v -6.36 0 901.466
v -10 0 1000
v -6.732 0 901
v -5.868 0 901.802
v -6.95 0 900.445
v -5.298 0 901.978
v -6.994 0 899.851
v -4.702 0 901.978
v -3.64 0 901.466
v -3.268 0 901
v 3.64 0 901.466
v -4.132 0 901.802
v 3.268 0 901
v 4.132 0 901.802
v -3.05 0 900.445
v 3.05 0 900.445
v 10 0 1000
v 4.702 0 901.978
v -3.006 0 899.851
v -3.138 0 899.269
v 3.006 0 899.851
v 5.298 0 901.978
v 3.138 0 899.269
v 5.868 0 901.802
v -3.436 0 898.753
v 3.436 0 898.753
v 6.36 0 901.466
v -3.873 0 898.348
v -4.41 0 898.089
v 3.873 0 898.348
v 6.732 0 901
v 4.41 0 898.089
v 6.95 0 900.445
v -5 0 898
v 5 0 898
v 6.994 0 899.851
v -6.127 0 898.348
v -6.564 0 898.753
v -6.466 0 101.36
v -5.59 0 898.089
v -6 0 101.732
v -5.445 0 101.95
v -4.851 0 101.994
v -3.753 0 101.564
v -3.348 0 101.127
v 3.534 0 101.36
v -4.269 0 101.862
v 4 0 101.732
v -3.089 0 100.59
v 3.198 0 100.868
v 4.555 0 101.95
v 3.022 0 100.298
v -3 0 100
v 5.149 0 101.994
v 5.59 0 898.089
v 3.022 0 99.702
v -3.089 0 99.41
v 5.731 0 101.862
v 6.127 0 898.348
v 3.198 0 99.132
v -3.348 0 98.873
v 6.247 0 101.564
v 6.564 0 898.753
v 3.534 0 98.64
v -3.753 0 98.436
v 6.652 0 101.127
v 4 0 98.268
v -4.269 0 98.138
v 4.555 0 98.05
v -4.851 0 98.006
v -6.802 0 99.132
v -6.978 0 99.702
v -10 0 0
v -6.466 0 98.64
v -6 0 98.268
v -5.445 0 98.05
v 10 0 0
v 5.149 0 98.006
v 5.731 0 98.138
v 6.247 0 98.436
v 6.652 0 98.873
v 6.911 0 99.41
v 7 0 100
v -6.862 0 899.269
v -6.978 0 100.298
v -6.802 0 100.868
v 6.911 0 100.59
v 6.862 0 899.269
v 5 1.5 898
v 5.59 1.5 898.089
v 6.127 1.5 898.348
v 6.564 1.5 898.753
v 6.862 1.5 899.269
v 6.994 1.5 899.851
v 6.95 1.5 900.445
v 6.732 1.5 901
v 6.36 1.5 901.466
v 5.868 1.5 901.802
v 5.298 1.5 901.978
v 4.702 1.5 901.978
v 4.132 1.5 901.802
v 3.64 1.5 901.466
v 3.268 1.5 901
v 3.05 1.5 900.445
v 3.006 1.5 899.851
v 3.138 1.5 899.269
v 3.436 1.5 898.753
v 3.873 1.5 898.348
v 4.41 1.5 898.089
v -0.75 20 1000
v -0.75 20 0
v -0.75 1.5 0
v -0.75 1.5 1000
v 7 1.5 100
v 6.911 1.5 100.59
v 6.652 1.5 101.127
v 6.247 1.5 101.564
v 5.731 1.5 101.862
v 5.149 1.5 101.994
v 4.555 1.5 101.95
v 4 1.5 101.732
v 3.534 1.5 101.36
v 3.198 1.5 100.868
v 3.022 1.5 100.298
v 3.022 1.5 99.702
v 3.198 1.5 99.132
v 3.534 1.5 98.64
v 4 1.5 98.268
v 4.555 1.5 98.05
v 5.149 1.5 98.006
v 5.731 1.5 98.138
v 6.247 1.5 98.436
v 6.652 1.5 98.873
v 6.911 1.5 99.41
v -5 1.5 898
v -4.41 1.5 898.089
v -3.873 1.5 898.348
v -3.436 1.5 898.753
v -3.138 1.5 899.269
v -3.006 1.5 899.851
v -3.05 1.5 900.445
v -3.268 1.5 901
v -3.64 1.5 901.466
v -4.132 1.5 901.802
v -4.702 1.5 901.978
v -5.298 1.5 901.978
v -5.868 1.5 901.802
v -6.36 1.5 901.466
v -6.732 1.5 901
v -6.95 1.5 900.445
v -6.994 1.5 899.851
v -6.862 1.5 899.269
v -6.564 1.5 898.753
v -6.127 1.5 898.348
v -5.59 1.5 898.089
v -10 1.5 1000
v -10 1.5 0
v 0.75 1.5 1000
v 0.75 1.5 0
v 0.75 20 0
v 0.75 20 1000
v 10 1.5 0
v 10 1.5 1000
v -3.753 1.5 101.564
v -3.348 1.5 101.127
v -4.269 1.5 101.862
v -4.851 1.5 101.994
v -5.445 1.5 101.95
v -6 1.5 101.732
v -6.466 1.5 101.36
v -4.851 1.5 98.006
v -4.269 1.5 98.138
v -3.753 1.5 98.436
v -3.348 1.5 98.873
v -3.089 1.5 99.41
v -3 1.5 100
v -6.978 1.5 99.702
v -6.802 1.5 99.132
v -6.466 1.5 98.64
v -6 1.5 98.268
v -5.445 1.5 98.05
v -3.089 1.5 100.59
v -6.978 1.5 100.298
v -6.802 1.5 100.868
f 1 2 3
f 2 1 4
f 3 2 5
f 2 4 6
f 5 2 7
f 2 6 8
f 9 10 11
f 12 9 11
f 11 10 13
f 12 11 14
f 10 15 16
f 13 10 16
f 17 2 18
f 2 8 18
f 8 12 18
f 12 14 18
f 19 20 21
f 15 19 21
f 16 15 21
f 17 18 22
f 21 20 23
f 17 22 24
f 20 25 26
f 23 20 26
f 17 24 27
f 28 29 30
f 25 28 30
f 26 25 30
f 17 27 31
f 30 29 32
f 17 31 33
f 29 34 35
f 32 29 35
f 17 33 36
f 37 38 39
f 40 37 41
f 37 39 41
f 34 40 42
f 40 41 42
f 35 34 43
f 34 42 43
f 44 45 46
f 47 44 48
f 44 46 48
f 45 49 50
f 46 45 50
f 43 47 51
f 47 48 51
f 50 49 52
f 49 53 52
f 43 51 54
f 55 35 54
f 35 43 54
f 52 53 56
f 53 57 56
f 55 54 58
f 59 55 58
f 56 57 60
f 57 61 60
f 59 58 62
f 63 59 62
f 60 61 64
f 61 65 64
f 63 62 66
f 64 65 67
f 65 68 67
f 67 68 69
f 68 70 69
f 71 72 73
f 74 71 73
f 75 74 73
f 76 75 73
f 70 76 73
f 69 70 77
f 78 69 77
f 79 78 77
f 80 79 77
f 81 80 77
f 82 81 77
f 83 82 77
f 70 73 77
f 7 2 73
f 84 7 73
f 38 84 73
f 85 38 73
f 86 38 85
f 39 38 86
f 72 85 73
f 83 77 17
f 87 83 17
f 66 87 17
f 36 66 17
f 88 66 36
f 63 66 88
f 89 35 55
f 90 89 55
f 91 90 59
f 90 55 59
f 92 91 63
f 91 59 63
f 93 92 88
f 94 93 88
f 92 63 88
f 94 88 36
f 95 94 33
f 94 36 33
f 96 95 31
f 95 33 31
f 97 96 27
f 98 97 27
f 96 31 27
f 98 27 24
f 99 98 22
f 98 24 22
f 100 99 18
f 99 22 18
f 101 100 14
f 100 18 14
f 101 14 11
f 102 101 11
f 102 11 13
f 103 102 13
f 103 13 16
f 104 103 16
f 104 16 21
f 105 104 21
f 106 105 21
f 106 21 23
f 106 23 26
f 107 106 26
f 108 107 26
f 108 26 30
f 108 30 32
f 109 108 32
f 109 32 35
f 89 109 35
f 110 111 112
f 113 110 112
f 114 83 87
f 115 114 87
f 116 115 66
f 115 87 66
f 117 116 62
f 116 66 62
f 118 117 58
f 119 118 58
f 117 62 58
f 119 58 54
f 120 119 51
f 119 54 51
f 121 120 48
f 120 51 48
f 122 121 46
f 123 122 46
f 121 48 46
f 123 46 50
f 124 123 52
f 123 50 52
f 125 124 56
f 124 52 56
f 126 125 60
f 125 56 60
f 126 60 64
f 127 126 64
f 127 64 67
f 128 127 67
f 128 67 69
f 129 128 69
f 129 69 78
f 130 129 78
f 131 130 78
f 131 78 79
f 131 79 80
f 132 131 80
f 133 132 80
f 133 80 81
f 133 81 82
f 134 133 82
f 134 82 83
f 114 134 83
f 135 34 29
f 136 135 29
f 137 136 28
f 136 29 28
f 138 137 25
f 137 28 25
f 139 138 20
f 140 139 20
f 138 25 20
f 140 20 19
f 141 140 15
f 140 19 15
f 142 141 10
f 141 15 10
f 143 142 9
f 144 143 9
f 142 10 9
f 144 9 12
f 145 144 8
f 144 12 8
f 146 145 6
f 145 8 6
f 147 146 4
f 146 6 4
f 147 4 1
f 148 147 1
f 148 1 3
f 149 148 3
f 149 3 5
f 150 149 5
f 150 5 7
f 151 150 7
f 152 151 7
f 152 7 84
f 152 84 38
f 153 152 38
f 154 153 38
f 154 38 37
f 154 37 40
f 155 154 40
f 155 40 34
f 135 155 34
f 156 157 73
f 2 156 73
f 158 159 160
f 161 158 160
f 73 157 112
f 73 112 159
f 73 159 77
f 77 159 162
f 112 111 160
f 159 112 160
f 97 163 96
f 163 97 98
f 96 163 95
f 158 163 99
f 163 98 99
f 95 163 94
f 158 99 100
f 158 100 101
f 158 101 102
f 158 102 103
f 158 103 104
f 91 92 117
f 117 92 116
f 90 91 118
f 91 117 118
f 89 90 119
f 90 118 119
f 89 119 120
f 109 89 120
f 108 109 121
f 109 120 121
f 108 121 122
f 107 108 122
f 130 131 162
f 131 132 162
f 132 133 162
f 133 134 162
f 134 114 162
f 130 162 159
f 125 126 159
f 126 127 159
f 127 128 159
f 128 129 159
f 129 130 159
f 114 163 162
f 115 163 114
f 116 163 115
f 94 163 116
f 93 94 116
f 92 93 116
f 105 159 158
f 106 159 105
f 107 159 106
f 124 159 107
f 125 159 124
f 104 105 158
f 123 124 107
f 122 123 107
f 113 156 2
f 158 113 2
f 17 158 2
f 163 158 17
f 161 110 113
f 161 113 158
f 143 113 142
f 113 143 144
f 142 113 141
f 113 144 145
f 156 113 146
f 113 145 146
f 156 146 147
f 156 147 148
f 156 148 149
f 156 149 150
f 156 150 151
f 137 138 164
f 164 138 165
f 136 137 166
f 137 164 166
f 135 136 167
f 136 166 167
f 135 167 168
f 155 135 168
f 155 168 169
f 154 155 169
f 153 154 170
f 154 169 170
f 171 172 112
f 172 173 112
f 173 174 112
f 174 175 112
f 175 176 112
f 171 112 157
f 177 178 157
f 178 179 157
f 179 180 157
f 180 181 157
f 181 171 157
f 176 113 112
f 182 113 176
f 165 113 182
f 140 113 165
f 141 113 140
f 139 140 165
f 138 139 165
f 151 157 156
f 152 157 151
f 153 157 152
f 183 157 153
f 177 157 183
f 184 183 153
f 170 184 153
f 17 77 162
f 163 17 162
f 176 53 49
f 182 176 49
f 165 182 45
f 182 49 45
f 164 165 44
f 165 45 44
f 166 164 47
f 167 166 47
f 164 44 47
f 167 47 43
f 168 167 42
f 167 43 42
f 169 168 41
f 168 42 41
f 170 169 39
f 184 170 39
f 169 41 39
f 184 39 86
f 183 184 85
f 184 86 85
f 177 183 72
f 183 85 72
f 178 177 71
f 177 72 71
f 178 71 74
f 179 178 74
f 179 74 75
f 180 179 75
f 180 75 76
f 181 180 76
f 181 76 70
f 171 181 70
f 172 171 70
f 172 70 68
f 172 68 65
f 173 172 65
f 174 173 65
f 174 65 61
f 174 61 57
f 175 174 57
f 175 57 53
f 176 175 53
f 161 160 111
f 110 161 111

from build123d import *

# Parameters (mm, degrees)
EXTRUDE_1_DEPTH     = 1000
SKETCH_2_R          = 2
CUT_EXTRUDE_1_DEPTH = 10


with BuildPart() as part:
    # Эскиз1 → Бобышка-Вытянуть1 (new body)
    with BuildSketch(Plane.XY):
        Polygon((0.75, 20), (-0.75, 20), (-0.75, 1.5), (-10, 1.5), (-10, 0), (10, 0), (10, 1.5), (0.75, 1.5), align=None)
    extrude(amount=EXTRUDE_1_DEPTH)

    # Эскиз2 → Вырез-Вытянуть1 (cut)
    with BuildSketch(Plane.XZ):
        with Locations(Location((5, 900, 0), (0, 0, 270))):
            Circle(SKETCH_2_R)
        with Locations(Location((-5, 900, 0), (0, 0, 270))):
            Circle(SKETCH_2_R)
        with Locations((5, 100)):
            Circle(SKETCH_2_R)
        with Locations((-5, 100)):
            Circle(SKETCH_2_R)
    extrude(amount=-CUT_EXTRUDE_1_DEPTH, mode=Mode.SUBTRACT)


solid = part.part
